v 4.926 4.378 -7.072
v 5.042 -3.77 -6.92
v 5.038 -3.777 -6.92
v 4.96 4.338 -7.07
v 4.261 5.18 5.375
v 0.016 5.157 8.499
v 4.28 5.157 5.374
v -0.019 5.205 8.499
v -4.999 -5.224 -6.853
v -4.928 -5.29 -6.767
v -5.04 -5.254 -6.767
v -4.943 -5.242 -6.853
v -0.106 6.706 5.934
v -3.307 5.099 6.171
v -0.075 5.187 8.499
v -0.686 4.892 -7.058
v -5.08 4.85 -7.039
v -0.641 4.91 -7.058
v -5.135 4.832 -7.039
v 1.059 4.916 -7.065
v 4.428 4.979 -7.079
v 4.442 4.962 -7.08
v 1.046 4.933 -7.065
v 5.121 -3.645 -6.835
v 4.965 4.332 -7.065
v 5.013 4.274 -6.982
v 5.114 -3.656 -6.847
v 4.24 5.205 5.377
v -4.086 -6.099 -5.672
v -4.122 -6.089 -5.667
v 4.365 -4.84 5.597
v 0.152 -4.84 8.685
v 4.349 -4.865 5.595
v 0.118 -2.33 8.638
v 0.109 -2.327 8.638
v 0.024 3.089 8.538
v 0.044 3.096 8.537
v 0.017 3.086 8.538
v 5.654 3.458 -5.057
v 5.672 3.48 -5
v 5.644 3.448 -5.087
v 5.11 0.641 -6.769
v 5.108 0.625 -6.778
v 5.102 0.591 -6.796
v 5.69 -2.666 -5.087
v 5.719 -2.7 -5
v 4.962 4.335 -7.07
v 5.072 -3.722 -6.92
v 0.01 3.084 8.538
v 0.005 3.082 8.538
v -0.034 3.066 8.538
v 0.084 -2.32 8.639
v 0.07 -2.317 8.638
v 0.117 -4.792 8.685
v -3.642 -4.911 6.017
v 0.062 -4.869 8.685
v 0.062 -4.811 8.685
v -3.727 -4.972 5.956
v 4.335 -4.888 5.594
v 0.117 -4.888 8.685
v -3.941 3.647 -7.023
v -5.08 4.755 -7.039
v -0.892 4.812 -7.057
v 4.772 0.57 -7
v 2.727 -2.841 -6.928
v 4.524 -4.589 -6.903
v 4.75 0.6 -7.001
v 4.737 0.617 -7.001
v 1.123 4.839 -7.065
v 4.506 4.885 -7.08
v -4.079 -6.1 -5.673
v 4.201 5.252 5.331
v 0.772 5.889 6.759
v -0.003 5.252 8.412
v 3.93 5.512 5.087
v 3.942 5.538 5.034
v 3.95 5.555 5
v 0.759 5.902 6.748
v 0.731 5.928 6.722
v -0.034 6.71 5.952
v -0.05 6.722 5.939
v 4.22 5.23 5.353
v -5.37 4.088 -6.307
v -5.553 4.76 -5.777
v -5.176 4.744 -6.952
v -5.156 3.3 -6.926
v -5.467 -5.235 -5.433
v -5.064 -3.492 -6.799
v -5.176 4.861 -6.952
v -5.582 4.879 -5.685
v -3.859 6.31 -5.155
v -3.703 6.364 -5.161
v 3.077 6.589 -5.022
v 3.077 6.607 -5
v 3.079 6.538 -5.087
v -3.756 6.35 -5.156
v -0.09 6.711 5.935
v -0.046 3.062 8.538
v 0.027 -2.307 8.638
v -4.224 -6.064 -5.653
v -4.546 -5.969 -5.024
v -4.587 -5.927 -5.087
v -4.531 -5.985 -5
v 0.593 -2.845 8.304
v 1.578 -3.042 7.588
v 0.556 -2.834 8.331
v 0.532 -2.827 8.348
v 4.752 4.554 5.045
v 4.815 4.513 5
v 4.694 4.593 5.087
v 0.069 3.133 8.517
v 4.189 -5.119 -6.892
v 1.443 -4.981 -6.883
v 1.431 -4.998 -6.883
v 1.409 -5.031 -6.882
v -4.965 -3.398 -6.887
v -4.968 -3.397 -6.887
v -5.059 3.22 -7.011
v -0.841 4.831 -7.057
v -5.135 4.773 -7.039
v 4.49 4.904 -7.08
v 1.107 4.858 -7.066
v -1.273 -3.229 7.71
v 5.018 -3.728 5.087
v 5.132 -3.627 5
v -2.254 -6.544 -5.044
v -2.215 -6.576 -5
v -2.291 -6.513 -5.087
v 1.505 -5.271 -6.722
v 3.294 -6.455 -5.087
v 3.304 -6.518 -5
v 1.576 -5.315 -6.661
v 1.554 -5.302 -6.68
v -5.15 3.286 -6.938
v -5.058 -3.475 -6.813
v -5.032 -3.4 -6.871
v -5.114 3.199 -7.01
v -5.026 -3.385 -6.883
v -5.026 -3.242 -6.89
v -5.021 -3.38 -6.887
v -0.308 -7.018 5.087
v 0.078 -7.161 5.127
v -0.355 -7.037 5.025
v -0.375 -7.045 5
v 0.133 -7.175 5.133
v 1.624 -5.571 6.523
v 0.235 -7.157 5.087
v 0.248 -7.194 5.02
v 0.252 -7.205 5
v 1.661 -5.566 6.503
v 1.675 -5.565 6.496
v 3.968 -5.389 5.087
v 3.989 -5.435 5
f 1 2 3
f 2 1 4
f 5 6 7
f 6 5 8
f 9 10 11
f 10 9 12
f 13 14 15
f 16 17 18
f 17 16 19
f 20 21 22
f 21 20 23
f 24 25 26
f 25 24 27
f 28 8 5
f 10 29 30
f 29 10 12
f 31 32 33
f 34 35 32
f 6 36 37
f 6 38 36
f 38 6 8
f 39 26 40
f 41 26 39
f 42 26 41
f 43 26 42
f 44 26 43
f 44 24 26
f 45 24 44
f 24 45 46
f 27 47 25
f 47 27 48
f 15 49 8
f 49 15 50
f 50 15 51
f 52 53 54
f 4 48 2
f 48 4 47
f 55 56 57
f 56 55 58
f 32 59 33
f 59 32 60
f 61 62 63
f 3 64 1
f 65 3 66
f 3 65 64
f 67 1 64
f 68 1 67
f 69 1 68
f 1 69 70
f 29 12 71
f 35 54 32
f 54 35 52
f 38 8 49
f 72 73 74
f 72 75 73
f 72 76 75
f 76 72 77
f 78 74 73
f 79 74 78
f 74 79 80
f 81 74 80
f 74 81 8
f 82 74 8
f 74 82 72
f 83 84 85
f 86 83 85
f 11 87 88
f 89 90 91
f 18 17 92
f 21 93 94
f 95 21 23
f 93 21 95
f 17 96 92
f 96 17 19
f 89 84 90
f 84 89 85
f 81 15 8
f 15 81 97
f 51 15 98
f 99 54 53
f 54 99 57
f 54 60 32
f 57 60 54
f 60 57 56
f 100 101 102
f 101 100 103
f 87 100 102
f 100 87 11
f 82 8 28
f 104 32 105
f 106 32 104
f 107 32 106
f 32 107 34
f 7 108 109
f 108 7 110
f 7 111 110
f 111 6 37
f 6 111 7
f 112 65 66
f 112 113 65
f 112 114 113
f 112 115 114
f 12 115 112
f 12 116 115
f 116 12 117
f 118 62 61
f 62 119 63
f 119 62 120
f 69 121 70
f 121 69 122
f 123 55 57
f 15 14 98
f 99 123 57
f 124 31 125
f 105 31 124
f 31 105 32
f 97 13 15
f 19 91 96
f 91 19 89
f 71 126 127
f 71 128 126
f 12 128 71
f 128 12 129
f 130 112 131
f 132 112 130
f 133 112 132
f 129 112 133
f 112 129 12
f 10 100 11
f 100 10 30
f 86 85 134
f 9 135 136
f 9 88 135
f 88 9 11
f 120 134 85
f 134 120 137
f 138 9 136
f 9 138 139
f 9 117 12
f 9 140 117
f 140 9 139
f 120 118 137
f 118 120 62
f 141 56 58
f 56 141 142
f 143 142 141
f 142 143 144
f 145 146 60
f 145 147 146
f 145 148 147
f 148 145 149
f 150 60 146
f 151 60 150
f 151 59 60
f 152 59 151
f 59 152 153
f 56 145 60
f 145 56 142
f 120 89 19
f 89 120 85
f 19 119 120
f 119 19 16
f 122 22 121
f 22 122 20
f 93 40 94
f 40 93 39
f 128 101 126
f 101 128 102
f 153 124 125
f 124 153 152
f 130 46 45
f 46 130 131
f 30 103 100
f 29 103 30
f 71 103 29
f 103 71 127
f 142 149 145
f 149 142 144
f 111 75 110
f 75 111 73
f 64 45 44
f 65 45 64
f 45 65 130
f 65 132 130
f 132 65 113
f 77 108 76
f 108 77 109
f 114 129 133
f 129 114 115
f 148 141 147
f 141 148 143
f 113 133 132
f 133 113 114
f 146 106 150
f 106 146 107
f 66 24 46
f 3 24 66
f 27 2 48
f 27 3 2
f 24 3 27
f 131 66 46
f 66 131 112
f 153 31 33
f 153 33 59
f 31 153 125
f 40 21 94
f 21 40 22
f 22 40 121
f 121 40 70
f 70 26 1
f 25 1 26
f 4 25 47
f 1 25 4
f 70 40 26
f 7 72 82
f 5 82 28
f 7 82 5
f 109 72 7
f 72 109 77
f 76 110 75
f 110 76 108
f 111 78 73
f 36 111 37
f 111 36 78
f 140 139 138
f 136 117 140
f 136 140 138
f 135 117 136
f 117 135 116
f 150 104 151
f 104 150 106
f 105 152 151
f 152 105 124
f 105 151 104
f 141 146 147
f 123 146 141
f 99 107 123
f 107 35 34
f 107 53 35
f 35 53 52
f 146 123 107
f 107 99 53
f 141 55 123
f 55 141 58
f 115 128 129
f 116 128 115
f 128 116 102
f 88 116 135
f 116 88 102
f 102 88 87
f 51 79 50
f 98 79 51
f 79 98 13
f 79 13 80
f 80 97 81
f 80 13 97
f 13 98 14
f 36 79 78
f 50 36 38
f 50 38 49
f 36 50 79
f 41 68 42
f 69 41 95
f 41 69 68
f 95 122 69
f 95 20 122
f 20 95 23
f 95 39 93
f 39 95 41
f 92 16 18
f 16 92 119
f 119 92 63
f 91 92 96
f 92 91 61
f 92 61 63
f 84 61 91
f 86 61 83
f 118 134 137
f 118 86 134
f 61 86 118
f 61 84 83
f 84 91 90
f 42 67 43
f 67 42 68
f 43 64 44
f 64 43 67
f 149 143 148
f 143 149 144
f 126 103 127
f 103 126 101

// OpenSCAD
// Auto-generated OpenSCAD file

    inner_points = 10*[[0.2467382987372412, -0.7682886734949378, -0.49999999999986955], [0.24673829873693467, -0.7682886734948948, 0.5000000000001305], [-0.786615939624791, 0.4767868289582747, -0.5000000000002401], [-0.7866159396250976, 0.47678682895831764, 0.4999999999997599], [0.7812222187521125, 0.07688996989682276, -0.499999999999742], [0.7812222187518058, 0.07688996989686578, 0.5000000000002579], [0.14257417702561617, 0.8463889489727611, -0.499999999999971], [0.14257417702530947, 0.8463889489728041, 0.500000000000029], [-0.7222389719987257, -0.5211388226006342, -0.5000000000001773], [-0.7222389719990324, -0.5211388226005911, 0.49999999999982264], [-0.06766404342154811, 0.022127650346434623, -1.0257311121191337], [-0.06766404342217727, 0.022127650346523024, 1.0257311121191337]];

    outer_points = 10*[[0.49039615507641166, 0.4938060709977507, -0.6994812171045163], [0.5040254575535104, -0.5059280714671878, -0.6808831929115636], [-0.8147039687334786, 0.4938060709977507, 0.25694319474479665], [-0.8010746662563799, -0.5059280714671878, 0.2755412189377493], [0.8031669173012401, 0.5157349758527835, 0.2500942530026042], [0.8167962197783389, -0.48399916661215503, 0.26869227719555683], [-0.0034293179349679237, 0.5157349758527835, 0.8411970471956072], [0.010199984542130835, -0.48399916661215503, 0.8597950713885598], [-0.5095030419019521, 0.48025326246127786, -0.6952483383208733], [-0.49587373942485335, -0.5194808800036607, -0.6766503141279206], [-0.01397999958724252, 1.02545841377403, -0.019076572038655804], [0.01397999958724252, -1.02545841377403, 0.019076572038655804]];

    // Convex hull for inner set (I)
    module inner_hull() {
        hull() {
            for (p = inner_points) {
                translate(p) sphere(r=0.1);
            }
        }
    }

    // Convex hull for outer set (O) minus inner hull (O \ I)
    module outer_minus_inner() {
        difference() {
            hull() {
                for (p = outer_points) {
                    translate(p) sphere(r=0.1);
                }
            }
            inner_hull(); // Subtract inner hull
        }
    }

    // Convex hull for outer set (O) minus all translated inner hulls
    module outer_minus_AllTranslationInner() {
        difference() {
            hull() {
                for (p = outer_points) {
                    translate(p) sphere(r=0.1);
                }
            }
            hull() {
                translate([0,0,50]) inner_hull();
                translate([0,0,-50]) inner_hull();
            }; // Subtract translated inner hulls
        }
    }

    // Difference between outer_minus_inner and outer_minus_AllTranslationInner
    module outer_minus_inner_diff() {
        difference() {
            // Outer minus inner
            difference() {
                hull() {
                    for (p = outer_points) {
                        translate(p) sphere(r=0.1);
                    }
                }
                inner_hull();
            }

            // Subtract Outer minus AllTranslationInner
            difference() {
                hull() {
                    for (p = outer_points) {
                        translate(p) sphere(r=0.1);
                    }
                }
                hull() {
                    translate([0,0,50]) inner_hull();
                    translate([0,0,-50]) inner_hull();
                };
            }
        }
    }

    // Rendering all with colors applied
    color([1, 1, 0, 1]) outer_minus_inner_diff(); // Opaque yellow
    
